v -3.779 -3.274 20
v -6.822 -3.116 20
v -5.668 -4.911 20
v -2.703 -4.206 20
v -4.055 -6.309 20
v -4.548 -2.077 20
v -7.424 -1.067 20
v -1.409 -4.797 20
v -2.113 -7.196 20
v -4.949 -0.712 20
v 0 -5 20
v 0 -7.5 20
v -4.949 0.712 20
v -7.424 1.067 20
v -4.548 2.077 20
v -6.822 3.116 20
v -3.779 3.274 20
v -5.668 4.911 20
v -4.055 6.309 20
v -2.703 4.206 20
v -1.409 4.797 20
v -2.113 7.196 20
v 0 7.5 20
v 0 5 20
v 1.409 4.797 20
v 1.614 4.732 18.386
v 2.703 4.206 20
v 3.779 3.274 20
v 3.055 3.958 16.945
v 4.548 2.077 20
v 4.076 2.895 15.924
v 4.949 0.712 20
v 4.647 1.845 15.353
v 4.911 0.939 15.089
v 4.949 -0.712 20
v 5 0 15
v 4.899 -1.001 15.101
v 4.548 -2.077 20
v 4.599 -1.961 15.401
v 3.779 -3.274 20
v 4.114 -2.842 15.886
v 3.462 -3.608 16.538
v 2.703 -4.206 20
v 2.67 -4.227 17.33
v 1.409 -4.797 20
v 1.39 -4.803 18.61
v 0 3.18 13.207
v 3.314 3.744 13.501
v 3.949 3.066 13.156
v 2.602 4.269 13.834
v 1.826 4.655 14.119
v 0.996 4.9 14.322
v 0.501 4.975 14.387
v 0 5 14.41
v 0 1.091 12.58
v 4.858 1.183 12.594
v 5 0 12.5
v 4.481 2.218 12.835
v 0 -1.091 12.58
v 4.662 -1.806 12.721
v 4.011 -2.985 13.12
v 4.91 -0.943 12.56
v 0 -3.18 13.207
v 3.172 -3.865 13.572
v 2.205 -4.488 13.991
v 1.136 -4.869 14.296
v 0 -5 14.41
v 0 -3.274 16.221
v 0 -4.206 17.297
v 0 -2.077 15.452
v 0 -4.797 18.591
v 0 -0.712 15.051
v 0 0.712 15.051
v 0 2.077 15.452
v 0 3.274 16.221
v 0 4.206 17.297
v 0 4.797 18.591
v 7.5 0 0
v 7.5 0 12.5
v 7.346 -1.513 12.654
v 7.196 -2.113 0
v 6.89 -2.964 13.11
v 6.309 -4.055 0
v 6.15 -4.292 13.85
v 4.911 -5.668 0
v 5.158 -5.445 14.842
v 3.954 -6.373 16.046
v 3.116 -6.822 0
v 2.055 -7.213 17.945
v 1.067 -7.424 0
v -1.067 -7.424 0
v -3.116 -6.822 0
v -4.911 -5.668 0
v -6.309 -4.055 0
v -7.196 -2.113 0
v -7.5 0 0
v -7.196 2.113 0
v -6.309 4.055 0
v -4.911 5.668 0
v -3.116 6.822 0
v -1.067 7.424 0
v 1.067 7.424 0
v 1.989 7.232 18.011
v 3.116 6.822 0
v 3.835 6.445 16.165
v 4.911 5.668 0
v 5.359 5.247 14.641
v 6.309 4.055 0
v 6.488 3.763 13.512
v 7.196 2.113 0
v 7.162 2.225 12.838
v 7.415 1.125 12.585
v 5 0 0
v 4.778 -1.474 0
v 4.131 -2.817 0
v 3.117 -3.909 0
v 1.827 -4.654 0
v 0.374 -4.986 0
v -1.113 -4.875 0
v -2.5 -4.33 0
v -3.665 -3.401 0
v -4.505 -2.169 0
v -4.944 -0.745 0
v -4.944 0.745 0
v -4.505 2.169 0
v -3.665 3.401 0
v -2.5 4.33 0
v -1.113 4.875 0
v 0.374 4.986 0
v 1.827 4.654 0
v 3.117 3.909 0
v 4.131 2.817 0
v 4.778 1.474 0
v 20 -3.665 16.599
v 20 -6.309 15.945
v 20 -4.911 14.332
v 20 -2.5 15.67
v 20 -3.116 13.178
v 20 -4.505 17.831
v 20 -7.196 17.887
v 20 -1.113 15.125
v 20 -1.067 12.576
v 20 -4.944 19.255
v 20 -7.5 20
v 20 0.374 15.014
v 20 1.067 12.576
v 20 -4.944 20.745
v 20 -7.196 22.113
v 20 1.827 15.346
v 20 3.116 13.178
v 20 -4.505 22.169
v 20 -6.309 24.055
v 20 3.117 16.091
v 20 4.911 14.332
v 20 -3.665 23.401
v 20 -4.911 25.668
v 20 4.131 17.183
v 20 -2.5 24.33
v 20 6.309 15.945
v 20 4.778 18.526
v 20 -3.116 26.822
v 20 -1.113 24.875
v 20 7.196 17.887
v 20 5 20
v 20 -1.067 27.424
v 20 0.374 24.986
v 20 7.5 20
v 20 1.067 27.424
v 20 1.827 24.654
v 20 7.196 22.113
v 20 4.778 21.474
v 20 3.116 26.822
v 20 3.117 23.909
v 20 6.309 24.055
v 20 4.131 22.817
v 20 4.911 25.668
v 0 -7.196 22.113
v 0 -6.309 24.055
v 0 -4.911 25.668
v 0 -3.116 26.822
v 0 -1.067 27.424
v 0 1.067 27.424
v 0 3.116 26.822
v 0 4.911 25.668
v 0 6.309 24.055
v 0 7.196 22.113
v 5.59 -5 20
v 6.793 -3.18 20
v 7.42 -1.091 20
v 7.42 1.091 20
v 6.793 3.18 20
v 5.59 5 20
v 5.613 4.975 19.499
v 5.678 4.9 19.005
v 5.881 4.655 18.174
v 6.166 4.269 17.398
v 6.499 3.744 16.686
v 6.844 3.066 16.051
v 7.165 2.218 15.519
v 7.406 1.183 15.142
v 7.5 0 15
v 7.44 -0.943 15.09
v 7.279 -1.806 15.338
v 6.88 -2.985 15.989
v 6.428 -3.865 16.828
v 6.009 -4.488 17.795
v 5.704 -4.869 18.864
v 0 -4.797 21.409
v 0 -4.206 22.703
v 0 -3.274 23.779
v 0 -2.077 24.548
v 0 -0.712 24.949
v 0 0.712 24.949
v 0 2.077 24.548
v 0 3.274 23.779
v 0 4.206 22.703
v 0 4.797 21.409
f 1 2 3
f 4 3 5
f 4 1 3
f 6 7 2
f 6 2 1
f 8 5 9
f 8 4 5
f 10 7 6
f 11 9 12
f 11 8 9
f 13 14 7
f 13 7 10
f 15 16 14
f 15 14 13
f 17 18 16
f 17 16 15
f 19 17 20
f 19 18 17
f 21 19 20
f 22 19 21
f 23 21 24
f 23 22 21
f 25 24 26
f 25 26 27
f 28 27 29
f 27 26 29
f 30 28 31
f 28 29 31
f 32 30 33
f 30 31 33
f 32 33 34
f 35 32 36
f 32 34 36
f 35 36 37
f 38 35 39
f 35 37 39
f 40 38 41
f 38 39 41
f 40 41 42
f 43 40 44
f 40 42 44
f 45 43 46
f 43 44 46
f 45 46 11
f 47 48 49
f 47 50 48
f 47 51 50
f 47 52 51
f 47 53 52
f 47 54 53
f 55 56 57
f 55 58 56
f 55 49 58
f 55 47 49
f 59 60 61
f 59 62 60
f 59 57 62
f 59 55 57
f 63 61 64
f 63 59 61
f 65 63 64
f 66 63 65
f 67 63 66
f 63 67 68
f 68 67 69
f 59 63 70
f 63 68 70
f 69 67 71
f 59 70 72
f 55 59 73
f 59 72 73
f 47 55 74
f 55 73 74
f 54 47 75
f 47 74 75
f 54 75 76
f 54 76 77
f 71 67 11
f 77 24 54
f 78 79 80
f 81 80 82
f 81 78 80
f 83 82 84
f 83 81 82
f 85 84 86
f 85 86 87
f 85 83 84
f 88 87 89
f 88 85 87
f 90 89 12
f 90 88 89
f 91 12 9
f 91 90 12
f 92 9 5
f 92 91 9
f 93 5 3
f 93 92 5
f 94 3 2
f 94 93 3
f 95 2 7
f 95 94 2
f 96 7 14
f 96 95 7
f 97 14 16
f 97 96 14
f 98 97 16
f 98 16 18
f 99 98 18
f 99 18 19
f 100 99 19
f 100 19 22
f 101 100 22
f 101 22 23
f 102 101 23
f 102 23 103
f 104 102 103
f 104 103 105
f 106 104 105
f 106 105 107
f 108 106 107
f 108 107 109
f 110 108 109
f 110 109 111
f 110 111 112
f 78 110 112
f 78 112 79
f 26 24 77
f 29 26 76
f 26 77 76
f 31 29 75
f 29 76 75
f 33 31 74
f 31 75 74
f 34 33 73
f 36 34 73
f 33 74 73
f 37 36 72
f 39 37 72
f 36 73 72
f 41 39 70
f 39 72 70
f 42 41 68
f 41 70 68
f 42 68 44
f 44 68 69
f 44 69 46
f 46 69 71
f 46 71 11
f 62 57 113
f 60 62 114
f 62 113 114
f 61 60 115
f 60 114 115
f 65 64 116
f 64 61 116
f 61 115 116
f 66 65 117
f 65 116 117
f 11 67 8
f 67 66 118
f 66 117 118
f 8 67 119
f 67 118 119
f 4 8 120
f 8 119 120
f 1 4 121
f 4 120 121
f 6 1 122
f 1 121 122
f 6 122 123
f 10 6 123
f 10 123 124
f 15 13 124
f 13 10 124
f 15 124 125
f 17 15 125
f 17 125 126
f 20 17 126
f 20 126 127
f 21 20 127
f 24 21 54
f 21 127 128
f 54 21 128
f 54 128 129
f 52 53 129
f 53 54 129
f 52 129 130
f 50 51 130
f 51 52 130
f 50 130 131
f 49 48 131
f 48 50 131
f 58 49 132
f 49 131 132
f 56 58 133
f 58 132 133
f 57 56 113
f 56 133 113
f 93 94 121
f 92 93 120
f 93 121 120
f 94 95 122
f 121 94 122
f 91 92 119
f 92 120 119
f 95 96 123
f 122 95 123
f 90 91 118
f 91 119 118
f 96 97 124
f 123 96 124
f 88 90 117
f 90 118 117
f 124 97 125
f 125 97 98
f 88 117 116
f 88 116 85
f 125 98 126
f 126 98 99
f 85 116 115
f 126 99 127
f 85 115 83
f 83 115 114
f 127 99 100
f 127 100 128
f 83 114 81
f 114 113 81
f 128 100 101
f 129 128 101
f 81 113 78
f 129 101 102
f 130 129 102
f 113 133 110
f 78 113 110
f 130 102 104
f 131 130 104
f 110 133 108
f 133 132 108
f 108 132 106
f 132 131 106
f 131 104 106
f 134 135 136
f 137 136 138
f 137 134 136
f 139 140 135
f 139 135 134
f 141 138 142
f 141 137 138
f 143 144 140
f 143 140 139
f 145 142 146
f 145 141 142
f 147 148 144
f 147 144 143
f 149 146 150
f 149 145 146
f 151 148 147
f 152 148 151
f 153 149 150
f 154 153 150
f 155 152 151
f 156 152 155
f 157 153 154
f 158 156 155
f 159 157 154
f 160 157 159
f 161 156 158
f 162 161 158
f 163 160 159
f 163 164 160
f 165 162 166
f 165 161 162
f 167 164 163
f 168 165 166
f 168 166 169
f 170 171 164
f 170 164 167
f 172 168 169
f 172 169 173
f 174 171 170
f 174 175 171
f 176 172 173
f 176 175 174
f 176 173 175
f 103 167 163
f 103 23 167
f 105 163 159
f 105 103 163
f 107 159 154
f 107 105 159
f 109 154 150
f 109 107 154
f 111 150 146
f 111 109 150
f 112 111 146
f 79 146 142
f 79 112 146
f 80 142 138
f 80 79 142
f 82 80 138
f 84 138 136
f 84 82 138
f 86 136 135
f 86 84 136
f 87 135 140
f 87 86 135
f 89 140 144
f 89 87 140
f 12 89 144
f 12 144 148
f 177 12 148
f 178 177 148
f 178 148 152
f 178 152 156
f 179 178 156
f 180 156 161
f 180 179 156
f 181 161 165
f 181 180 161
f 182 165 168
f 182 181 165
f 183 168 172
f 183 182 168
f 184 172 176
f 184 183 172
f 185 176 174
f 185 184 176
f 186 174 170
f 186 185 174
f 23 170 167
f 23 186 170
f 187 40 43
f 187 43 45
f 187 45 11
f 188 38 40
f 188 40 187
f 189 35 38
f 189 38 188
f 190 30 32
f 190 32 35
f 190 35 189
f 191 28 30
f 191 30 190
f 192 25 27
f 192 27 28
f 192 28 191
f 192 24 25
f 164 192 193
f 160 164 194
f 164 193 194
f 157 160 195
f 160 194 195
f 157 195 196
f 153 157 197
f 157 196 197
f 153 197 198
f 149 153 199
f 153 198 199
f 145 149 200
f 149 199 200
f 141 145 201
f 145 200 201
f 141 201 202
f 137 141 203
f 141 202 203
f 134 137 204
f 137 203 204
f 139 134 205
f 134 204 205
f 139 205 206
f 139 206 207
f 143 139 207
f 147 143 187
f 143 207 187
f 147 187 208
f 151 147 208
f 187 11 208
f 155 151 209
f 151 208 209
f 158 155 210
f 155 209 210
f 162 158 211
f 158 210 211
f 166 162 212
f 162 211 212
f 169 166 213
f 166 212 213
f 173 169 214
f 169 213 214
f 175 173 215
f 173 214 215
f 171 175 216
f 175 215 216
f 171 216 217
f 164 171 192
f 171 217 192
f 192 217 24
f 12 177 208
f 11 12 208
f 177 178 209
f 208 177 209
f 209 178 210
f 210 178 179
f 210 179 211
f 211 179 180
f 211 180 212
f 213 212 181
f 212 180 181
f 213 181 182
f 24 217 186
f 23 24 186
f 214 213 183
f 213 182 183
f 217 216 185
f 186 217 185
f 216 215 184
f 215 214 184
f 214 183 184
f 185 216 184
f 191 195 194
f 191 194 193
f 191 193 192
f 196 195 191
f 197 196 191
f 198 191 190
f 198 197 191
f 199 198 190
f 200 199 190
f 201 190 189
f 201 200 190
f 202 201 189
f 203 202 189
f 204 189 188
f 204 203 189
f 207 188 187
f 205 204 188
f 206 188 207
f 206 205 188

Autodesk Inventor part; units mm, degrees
ref_plane "YZ Plane" through (0, 0, 0) normal (1, 0, 0) x (0, 1, 0)
ref_plane "XZ Plane" through (0, 0, 0) normal (0, 1, 0) x (-1, 0, 0)
ref_plane "XY Plane" through (0, 0, 0) normal (0, 0, 1) x (1, 0, 0)
sketch "Sketch1" plane through (0, 0, 0) normal (0, 0, 1) x (1, 0, 0)
  circle A0 centre (0, 0) radius 5
  circle A1 centre (0, 0) radius 7.5
  dimension "d0" = 10
  dimension "d1" = 15
extrude "Extrusion1" add sketch "Sketch1" along normal blind 20
sketch "Sketch2" plane through (0, 0, 0) normal (1, 0, 0) x (0, 1, 0)
  line L0 (7.5, 20) -> (-7.5, 20) projected
  circle A0 centre (0, 20) radius 5
  circle A1 centre (0, 20) radius 7.5
  point P0 (0, 0)
  dimension "d4" = 10
  dimension "d5" = 15
extrude "Extrusion2" add sketch "Sketch2" along normal blind 20 contours A1 L0 A0 | L0 A0 A1
properties part number "ccccccc"
